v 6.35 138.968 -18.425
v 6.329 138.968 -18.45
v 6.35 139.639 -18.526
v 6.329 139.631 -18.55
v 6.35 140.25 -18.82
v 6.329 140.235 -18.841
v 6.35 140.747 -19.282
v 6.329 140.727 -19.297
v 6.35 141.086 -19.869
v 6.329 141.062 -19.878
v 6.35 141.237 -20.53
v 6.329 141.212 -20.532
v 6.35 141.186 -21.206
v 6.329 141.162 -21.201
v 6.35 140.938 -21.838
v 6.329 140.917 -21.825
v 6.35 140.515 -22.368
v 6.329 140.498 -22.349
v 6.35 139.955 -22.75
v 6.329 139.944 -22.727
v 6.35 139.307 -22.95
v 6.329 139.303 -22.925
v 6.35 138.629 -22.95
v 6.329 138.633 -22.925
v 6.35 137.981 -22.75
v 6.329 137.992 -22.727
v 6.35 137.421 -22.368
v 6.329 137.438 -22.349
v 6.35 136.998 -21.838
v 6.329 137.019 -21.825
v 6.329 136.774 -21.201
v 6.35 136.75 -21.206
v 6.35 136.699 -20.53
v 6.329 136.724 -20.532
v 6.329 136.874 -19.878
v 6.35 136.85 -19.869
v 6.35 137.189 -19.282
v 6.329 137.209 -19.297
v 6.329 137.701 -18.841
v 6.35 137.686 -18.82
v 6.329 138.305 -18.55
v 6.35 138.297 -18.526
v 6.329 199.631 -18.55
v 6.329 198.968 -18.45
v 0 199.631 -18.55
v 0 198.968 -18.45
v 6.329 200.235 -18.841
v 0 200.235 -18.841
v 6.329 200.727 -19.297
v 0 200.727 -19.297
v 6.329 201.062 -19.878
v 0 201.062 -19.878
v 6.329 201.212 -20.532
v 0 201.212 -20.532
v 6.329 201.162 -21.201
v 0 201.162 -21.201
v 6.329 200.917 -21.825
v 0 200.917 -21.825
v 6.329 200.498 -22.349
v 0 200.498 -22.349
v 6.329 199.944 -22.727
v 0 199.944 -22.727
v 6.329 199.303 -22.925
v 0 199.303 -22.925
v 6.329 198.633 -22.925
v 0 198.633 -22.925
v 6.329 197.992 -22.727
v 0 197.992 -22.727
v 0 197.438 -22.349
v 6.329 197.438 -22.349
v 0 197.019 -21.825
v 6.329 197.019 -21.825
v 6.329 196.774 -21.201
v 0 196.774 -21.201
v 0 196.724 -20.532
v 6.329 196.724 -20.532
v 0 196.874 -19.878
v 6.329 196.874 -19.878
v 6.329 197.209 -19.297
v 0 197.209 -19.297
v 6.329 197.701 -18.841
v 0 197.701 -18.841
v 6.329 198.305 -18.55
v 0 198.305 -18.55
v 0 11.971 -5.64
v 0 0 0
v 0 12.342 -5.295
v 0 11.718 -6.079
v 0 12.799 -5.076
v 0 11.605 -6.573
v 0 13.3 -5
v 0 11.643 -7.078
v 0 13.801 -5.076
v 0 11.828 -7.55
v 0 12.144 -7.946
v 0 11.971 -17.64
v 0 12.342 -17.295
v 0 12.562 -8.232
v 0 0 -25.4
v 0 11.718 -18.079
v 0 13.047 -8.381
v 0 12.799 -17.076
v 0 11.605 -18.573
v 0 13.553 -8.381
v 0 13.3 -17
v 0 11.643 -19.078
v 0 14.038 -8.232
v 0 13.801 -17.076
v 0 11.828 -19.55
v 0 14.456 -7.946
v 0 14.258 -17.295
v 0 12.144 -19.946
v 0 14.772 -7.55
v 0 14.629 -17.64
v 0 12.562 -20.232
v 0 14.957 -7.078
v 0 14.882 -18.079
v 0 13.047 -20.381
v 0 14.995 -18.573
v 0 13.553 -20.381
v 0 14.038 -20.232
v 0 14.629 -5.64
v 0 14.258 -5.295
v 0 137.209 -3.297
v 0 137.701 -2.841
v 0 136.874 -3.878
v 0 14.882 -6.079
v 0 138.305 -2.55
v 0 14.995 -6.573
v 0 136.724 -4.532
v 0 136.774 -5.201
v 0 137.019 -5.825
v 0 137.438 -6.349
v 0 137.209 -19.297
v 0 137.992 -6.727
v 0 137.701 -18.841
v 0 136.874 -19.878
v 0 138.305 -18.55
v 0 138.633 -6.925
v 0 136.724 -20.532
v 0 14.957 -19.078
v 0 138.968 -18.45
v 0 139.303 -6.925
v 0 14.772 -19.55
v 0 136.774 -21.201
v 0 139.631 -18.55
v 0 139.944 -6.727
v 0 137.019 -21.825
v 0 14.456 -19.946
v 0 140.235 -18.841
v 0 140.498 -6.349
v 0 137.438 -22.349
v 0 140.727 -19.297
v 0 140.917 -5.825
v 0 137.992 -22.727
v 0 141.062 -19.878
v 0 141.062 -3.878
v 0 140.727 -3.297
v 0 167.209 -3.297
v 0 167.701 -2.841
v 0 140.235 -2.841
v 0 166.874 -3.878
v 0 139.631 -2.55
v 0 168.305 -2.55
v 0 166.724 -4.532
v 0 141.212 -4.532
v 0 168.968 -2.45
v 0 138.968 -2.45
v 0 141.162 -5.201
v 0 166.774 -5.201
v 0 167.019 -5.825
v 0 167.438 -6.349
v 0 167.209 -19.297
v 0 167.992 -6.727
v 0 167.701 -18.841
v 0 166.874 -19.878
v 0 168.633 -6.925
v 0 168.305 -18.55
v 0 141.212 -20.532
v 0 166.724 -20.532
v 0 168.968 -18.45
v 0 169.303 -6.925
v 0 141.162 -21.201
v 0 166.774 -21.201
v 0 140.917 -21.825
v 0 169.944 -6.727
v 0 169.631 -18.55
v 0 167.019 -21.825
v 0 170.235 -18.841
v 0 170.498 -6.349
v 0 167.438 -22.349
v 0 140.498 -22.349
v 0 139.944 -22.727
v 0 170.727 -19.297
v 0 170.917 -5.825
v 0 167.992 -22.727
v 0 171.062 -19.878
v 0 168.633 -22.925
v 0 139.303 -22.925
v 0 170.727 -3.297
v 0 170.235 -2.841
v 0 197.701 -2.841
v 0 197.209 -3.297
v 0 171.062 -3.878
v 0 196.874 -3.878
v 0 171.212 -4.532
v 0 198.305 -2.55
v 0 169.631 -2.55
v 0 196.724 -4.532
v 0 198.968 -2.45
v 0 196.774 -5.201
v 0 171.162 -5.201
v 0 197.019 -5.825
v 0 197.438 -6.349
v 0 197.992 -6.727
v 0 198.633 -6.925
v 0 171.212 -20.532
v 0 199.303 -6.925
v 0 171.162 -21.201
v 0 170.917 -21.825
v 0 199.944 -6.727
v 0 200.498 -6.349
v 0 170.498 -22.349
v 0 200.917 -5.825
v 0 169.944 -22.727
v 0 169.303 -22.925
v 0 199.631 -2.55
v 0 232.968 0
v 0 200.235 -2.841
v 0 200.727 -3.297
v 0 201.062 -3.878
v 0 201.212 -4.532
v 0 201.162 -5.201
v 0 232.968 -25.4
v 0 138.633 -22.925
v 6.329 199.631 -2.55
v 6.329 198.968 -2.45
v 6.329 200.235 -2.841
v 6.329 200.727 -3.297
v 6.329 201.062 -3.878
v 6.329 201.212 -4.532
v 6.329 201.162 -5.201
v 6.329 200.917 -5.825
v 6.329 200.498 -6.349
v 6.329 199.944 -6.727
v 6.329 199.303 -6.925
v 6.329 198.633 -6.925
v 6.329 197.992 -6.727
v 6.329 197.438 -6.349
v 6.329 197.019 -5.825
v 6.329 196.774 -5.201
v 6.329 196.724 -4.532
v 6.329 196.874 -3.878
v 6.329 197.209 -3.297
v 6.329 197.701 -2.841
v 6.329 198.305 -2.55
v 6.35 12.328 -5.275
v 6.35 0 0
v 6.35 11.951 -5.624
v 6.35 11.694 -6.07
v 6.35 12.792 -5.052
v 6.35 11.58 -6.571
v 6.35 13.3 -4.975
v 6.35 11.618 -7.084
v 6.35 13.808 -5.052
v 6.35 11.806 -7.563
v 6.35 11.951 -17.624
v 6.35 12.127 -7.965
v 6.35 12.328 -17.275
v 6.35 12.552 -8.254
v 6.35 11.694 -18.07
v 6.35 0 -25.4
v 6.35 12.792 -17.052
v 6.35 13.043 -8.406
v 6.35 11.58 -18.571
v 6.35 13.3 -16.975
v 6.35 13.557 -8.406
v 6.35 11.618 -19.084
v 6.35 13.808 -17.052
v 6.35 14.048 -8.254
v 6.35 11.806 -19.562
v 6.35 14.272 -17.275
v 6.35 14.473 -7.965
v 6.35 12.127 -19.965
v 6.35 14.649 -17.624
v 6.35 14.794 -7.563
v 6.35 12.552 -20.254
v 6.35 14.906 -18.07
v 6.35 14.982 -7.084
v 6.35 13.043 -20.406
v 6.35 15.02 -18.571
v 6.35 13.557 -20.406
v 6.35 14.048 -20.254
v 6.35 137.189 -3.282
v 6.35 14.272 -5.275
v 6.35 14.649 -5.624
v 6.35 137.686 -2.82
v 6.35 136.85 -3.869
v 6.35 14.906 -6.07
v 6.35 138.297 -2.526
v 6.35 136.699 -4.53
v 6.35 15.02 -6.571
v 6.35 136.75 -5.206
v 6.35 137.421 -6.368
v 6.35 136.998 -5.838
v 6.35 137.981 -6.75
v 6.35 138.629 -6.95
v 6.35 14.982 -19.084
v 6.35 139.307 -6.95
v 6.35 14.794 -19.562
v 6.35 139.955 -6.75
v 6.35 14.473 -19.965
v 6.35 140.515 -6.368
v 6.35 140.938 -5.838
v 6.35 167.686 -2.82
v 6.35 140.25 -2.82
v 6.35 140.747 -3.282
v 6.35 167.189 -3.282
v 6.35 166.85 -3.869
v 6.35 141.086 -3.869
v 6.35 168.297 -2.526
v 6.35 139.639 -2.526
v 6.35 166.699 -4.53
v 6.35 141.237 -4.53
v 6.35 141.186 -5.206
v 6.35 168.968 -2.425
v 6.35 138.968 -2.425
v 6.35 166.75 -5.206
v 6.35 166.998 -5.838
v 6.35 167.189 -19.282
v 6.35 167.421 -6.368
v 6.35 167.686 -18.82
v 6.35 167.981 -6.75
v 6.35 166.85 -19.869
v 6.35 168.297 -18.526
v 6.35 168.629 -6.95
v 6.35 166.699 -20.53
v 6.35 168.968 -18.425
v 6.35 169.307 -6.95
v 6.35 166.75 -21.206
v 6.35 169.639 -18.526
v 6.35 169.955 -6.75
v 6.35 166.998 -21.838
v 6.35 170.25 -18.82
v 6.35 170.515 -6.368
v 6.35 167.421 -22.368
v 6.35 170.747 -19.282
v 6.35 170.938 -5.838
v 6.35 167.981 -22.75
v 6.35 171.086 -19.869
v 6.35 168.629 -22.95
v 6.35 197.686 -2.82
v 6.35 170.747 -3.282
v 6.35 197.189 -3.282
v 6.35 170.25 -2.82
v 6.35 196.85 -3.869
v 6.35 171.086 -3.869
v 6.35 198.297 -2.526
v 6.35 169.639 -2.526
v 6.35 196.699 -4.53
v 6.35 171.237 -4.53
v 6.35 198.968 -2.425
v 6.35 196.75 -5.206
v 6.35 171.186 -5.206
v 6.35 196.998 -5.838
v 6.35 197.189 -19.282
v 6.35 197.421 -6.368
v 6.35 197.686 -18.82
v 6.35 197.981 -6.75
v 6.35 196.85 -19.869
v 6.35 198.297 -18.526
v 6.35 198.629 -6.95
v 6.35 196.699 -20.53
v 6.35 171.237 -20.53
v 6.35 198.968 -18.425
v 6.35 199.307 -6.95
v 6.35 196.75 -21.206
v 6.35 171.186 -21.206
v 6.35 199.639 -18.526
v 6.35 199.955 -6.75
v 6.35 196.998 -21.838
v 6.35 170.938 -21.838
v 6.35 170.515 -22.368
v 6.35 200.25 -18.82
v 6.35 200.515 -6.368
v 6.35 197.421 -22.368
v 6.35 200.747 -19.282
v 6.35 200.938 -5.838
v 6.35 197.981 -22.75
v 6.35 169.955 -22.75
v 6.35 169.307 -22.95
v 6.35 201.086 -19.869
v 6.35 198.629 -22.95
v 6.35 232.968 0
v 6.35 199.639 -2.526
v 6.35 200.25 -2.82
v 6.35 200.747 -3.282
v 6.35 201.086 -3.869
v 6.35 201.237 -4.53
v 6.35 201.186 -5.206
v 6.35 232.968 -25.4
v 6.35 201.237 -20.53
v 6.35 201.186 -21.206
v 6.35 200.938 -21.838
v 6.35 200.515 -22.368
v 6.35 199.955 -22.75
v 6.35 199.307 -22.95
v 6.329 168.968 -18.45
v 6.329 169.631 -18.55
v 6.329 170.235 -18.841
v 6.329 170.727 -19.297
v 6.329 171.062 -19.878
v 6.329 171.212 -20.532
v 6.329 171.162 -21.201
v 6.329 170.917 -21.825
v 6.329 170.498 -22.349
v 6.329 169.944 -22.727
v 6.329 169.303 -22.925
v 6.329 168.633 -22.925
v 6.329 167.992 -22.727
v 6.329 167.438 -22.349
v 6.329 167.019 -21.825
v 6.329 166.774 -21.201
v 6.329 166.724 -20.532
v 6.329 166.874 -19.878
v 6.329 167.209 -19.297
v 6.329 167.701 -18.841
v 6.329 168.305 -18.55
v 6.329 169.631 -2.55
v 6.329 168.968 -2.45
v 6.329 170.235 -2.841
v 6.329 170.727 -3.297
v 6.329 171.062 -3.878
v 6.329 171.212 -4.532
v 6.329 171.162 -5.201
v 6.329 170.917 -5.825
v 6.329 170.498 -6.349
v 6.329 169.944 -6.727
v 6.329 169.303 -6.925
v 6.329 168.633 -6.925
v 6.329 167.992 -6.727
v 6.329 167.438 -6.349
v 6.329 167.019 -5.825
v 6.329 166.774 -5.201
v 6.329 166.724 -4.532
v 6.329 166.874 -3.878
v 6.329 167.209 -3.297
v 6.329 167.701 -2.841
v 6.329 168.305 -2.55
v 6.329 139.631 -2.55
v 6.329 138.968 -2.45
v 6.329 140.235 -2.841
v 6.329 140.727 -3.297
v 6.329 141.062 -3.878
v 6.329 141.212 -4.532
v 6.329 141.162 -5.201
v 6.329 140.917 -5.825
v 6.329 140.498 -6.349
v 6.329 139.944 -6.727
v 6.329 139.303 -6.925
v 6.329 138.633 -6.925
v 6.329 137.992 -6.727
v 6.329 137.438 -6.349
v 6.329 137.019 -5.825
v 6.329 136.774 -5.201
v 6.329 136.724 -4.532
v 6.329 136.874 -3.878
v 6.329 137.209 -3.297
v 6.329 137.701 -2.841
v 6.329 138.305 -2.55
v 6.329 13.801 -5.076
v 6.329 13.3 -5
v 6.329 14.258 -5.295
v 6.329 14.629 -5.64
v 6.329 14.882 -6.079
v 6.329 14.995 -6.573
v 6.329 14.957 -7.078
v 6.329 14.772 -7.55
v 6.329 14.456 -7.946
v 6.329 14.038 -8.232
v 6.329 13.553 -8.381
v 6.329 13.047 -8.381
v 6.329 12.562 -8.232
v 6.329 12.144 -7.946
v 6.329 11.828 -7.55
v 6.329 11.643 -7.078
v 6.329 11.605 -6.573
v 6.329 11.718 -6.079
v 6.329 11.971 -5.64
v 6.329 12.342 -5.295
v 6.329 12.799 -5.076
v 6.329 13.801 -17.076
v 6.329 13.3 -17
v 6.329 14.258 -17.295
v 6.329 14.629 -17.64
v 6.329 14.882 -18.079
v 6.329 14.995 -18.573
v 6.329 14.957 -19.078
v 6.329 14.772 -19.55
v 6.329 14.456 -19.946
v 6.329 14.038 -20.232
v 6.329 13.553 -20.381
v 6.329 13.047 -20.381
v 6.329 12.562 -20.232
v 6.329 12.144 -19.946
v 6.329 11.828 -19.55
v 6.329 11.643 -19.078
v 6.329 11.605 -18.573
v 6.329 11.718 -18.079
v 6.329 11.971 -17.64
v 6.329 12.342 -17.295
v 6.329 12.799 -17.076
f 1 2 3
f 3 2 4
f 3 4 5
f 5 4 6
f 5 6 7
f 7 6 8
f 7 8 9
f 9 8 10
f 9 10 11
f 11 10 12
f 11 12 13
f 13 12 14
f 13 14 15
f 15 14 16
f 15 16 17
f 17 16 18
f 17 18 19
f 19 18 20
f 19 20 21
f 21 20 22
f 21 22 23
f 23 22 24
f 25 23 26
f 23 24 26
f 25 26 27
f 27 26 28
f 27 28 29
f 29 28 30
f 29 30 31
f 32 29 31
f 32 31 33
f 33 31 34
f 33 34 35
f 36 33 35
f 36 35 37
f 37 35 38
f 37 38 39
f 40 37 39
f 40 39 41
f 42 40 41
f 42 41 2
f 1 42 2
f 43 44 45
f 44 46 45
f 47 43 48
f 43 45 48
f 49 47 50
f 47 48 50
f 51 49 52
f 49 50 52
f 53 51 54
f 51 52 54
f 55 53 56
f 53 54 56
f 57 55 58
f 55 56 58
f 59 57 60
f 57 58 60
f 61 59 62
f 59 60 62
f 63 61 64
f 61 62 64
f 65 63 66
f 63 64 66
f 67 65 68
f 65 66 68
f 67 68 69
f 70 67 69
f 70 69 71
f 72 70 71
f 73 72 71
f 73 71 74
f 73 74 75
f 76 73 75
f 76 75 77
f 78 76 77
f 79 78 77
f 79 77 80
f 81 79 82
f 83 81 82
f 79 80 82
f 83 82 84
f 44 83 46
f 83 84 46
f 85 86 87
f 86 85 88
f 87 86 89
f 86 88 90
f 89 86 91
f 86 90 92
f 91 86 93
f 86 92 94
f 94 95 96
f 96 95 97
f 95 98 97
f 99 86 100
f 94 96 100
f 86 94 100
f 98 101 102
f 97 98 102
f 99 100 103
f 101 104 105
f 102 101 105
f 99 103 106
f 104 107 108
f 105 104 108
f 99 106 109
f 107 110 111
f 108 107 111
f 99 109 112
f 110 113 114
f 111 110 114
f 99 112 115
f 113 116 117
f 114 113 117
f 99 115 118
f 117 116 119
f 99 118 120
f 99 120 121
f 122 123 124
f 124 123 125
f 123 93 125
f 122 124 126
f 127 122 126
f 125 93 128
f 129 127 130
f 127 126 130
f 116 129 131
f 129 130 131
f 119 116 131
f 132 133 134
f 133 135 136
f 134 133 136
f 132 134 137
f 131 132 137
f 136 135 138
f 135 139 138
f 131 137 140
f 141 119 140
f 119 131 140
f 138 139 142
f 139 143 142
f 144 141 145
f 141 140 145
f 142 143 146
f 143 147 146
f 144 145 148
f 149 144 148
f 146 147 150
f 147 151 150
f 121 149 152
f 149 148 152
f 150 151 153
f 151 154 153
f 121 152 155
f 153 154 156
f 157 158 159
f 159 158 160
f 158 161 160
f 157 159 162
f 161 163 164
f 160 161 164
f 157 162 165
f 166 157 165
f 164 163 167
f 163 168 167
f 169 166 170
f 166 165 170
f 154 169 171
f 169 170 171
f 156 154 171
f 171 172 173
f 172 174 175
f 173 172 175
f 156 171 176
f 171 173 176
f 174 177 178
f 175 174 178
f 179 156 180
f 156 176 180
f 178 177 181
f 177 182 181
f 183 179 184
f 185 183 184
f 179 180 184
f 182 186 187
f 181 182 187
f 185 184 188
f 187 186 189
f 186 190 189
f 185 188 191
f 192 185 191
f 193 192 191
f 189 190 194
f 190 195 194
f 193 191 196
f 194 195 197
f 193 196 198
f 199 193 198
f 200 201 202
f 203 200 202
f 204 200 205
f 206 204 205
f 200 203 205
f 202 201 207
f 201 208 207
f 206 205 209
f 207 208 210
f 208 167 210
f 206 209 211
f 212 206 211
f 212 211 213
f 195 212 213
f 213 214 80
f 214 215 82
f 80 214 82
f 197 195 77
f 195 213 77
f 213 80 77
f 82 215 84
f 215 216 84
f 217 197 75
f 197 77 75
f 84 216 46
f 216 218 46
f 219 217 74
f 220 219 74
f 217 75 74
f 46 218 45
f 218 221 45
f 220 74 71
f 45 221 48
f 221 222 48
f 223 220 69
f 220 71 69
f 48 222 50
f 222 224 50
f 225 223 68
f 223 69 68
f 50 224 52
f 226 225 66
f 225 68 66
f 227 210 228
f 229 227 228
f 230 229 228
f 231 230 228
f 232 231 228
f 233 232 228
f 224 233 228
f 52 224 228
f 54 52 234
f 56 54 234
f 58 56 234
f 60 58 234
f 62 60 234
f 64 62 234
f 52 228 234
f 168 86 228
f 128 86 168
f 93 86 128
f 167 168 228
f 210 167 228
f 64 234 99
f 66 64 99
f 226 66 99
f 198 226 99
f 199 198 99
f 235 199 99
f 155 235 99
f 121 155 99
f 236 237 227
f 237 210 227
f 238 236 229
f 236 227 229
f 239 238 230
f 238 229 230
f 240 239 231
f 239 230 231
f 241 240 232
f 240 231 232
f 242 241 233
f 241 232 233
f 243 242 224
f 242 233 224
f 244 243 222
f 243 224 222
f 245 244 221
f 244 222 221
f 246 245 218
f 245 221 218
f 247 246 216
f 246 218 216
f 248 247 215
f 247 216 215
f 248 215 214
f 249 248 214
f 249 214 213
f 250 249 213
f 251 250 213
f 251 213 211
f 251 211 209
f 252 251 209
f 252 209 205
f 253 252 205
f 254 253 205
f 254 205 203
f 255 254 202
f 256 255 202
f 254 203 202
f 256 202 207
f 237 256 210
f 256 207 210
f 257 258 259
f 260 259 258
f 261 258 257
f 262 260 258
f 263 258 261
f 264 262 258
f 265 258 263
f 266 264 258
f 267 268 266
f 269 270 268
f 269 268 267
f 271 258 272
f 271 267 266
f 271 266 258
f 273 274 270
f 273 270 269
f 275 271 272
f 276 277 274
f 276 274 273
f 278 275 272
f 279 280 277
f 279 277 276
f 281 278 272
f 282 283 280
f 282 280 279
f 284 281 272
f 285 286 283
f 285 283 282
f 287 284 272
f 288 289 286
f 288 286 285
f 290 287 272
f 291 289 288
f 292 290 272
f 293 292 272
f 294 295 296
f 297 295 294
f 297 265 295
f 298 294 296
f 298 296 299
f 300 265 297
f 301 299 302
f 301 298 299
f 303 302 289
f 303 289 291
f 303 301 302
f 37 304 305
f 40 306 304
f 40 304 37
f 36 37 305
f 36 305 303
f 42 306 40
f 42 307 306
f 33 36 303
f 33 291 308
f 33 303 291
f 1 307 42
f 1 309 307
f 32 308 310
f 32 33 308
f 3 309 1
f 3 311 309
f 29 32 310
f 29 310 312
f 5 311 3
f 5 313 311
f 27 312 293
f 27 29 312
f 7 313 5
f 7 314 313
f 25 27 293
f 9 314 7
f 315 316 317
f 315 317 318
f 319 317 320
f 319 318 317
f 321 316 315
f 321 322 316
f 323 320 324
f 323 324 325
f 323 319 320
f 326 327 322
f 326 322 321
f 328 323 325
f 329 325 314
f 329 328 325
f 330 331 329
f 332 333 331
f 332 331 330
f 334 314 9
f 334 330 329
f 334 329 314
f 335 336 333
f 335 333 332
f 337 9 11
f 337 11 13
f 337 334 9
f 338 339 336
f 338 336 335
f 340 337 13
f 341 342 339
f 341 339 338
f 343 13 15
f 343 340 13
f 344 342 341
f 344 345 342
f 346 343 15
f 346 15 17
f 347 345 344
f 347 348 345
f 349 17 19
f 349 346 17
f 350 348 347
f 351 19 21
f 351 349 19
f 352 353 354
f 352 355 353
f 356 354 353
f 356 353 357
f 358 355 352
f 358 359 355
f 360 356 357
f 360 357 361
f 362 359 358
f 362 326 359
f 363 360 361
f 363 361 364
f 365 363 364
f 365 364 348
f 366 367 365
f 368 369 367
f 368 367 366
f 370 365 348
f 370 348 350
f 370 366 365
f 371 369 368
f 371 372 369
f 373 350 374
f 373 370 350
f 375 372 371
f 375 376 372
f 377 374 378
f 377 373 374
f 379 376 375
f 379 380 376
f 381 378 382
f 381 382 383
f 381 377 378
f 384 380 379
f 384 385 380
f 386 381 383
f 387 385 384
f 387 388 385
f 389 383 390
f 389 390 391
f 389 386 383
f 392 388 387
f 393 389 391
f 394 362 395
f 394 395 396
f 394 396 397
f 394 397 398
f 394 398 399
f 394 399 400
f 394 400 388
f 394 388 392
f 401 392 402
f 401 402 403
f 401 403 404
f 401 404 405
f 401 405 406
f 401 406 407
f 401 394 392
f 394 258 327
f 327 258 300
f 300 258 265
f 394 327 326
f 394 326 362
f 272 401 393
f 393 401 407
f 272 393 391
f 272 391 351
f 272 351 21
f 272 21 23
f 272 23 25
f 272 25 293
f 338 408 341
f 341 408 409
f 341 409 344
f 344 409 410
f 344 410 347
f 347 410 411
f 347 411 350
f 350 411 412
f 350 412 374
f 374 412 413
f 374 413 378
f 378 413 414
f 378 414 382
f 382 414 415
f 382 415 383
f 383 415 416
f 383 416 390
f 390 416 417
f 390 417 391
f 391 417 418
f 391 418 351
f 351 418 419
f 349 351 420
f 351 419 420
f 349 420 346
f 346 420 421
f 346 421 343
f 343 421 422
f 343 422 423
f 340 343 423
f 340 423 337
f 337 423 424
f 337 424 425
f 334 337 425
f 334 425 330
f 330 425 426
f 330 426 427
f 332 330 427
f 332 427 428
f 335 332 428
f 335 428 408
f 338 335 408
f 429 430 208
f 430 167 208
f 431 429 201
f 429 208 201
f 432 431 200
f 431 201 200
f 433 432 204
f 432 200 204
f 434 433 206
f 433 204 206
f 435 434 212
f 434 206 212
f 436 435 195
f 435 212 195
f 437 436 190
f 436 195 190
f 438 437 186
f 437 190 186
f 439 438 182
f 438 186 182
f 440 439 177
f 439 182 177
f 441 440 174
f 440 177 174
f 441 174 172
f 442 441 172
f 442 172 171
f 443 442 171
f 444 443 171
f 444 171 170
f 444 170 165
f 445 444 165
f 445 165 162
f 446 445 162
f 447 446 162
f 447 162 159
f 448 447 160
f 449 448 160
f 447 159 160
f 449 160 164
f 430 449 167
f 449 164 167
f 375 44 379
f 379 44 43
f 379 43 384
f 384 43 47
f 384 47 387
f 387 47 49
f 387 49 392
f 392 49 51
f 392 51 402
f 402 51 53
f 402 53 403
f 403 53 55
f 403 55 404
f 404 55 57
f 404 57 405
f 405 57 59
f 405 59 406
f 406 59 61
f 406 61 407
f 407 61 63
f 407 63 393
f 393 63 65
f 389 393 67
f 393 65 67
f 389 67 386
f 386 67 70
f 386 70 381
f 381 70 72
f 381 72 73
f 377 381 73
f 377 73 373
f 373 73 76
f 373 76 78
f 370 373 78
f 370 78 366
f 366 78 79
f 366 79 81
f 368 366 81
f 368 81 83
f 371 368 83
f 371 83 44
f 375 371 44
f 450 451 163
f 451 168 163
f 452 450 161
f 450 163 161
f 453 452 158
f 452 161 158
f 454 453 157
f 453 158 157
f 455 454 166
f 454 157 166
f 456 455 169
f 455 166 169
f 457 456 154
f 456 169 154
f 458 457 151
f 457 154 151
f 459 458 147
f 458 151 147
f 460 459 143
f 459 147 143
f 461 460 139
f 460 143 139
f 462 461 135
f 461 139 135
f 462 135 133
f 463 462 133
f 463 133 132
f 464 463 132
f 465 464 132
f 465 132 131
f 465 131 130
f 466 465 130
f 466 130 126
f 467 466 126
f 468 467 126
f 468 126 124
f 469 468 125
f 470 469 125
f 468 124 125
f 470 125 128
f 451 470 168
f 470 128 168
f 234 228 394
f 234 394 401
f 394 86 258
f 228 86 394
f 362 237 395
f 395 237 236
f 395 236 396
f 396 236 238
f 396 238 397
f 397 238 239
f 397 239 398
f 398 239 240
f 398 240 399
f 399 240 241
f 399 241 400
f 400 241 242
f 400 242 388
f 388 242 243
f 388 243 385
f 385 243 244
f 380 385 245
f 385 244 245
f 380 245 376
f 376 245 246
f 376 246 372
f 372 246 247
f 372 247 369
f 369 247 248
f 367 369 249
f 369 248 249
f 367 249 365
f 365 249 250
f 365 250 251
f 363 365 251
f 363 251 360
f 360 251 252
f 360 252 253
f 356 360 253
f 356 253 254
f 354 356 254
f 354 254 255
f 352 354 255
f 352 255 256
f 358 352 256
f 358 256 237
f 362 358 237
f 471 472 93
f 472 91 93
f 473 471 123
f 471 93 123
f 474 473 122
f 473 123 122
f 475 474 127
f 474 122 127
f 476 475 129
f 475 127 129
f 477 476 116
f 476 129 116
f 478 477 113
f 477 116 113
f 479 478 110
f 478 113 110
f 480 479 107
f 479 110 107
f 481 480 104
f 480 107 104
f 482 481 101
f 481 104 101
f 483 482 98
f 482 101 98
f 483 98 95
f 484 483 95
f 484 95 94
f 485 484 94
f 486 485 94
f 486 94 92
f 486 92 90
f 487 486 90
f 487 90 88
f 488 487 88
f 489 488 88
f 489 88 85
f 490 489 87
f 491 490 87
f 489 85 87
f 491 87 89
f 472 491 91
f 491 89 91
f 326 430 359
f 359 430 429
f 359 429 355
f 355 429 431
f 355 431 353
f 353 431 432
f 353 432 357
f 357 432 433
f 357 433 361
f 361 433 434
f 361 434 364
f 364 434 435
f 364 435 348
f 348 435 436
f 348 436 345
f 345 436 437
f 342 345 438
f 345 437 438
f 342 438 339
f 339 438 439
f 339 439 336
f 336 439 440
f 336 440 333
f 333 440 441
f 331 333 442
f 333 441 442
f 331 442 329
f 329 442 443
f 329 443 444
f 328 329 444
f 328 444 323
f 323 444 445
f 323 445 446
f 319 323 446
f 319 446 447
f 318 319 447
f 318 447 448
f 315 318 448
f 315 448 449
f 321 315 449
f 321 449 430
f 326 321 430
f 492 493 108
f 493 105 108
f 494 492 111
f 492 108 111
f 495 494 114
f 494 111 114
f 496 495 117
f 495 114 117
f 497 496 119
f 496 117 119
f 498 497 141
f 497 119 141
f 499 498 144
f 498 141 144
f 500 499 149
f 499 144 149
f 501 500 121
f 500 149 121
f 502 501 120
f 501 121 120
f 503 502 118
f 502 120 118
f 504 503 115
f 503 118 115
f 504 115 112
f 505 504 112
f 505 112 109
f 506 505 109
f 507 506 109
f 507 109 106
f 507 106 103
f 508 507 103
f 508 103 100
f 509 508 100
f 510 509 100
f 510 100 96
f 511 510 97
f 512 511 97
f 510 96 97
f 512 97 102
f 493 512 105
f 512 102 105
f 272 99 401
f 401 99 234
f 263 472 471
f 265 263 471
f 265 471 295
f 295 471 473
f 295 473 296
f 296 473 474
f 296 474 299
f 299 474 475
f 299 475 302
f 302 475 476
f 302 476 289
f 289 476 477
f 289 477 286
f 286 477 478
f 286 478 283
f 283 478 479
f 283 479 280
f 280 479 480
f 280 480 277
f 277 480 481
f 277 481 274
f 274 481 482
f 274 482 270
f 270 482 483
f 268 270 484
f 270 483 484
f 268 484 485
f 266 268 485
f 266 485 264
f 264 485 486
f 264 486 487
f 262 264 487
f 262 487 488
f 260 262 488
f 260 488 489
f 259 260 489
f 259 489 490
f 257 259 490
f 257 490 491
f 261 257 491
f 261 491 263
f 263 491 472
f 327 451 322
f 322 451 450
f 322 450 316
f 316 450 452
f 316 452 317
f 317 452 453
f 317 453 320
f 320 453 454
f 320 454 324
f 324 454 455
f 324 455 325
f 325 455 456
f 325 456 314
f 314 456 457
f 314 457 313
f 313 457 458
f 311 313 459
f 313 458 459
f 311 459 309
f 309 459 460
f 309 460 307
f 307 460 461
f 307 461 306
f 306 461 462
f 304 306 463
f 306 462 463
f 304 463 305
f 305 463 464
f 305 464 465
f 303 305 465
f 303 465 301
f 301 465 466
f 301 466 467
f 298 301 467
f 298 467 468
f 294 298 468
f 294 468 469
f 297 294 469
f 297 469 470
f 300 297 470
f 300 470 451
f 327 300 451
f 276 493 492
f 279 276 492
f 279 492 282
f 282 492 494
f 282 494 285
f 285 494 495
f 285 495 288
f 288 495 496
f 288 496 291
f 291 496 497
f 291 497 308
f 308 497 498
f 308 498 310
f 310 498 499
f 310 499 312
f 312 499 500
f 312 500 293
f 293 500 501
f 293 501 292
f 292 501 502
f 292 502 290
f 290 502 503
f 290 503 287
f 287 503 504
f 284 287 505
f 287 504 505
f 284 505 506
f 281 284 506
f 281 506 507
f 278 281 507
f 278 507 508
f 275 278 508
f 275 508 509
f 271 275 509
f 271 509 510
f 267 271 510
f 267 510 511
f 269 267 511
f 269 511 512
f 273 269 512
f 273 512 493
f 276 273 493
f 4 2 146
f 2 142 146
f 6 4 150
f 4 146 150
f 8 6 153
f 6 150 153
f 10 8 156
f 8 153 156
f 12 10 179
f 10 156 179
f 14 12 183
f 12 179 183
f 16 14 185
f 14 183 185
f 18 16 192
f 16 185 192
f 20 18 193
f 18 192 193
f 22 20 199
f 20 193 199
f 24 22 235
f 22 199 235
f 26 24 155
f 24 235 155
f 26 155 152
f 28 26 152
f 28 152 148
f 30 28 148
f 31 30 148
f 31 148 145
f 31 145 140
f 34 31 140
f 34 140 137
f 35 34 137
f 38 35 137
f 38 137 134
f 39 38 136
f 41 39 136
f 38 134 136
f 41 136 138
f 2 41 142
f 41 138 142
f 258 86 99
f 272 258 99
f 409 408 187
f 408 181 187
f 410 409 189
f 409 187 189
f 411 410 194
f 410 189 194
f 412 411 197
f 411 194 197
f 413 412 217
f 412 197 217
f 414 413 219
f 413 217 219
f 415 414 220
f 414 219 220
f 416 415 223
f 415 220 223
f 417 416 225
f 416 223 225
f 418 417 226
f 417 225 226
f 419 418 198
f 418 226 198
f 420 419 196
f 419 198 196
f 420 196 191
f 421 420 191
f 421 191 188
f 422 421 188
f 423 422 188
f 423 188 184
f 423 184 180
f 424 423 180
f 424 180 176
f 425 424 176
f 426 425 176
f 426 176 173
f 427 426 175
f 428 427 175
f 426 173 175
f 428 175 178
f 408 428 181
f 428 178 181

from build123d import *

# Parameters (mm, degrees)
SKETCH1_W                      = 25.4
SKETCH1_H                      = 232.968
BOSS_EXTRUDE1_DEPTH            = 6.35
M3_CLEARANCE_HOLE1_D           = 3.4
M3_CLEARANCE_HOLE1_DEPTH       = 7.493
M3_CLEARANCE_HOLE1_CSINK_D     = 3.45
M3_CLEARANCE_HOLE1_CSINK_ANGLE = 100
M3_CLEARANCE_HOLE1_TIP         = 1.021463052
M4_CLEARANCE_HOLE1_D           = 4.5
M4_CLEARANCE_HOLE1_DEPTH       = 10.1000052
M4_CLEARANCE_HOLE1_CSINK_D     = 4.55
M4_CLEARANCE_HOLE1_CSINK_ANGLE = 100
M4_CLEARANCE_HOLE1_TIP         = 1.351936393


with BuildPart() as part:
    # Sketch1 → Boss-Extrude1 (new body)
    with BuildSketch(Plane(origin=(0, 0, 0), x_dir=(0, 0, -1), z_dir=(1, 0, 0))):
        with Locations((12.7, 116.484)):
            Rectangle(SKETCH1_W, SKETCH1_H)
    extrude(amount=BOSS_EXTRUDE1_DEPTH)

    # M3 Clearance Hole1
    with Locations(Plane(origin=(6.35, 0, 0), x_dir=(0, 0, -1), z_dir=(1, 0, 0))):
        with Locations((6.7, 13.3), (18.7, 13.3)):
            CounterSinkHole(M3_CLEARANCE_HOLE1_D / 2, M3_CLEARANCE_HOLE1_CSINK_D / 2, depth=M3_CLEARANCE_HOLE1_DEPTH, counter_sink_angle=M3_CLEARANCE_HOLE1_CSINK_ANGLE)
            with Locations((0, 0, -(M3_CLEARANCE_HOLE1_DEPTH + M3_CLEARANCE_HOLE1_TIP / 2))):  # 118° drill point
                Cone(0, M3_CLEARANCE_HOLE1_D / 2, M3_CLEARANCE_HOLE1_TIP, mode=Mode.SUBTRACT)

    # M4 Clearance Hole1
    with Locations(Plane(origin=(6.35, 0, 0), x_dir=(0, 0, -1), z_dir=(1, 0, 0))):
        with Locations((4.7, 198.968), (4.7, 168.968), (4.7, 138.968), (20.7, 138.968), (20.7, 168.968), (20.7, 198.968)):
            CounterSinkHole(M4_CLEARANCE_HOLE1_D / 2, M4_CLEARANCE_HOLE1_CSINK_D / 2, depth=M4_CLEARANCE_HOLE1_DEPTH, counter_sink_angle=M4_CLEARANCE_HOLE1_CSINK_ANGLE)
            with Locations((0, 0, -(M4_CLEARANCE_HOLE1_DEPTH + M4_CLEARANCE_HOLE1_TIP / 2))):  # 118° drill point
                Cone(0, M4_CLEARANCE_HOLE1_D / 2, M4_CLEARANCE_HOLE1_TIP, mode=Mode.SUBTRACT)


solid = part.part
